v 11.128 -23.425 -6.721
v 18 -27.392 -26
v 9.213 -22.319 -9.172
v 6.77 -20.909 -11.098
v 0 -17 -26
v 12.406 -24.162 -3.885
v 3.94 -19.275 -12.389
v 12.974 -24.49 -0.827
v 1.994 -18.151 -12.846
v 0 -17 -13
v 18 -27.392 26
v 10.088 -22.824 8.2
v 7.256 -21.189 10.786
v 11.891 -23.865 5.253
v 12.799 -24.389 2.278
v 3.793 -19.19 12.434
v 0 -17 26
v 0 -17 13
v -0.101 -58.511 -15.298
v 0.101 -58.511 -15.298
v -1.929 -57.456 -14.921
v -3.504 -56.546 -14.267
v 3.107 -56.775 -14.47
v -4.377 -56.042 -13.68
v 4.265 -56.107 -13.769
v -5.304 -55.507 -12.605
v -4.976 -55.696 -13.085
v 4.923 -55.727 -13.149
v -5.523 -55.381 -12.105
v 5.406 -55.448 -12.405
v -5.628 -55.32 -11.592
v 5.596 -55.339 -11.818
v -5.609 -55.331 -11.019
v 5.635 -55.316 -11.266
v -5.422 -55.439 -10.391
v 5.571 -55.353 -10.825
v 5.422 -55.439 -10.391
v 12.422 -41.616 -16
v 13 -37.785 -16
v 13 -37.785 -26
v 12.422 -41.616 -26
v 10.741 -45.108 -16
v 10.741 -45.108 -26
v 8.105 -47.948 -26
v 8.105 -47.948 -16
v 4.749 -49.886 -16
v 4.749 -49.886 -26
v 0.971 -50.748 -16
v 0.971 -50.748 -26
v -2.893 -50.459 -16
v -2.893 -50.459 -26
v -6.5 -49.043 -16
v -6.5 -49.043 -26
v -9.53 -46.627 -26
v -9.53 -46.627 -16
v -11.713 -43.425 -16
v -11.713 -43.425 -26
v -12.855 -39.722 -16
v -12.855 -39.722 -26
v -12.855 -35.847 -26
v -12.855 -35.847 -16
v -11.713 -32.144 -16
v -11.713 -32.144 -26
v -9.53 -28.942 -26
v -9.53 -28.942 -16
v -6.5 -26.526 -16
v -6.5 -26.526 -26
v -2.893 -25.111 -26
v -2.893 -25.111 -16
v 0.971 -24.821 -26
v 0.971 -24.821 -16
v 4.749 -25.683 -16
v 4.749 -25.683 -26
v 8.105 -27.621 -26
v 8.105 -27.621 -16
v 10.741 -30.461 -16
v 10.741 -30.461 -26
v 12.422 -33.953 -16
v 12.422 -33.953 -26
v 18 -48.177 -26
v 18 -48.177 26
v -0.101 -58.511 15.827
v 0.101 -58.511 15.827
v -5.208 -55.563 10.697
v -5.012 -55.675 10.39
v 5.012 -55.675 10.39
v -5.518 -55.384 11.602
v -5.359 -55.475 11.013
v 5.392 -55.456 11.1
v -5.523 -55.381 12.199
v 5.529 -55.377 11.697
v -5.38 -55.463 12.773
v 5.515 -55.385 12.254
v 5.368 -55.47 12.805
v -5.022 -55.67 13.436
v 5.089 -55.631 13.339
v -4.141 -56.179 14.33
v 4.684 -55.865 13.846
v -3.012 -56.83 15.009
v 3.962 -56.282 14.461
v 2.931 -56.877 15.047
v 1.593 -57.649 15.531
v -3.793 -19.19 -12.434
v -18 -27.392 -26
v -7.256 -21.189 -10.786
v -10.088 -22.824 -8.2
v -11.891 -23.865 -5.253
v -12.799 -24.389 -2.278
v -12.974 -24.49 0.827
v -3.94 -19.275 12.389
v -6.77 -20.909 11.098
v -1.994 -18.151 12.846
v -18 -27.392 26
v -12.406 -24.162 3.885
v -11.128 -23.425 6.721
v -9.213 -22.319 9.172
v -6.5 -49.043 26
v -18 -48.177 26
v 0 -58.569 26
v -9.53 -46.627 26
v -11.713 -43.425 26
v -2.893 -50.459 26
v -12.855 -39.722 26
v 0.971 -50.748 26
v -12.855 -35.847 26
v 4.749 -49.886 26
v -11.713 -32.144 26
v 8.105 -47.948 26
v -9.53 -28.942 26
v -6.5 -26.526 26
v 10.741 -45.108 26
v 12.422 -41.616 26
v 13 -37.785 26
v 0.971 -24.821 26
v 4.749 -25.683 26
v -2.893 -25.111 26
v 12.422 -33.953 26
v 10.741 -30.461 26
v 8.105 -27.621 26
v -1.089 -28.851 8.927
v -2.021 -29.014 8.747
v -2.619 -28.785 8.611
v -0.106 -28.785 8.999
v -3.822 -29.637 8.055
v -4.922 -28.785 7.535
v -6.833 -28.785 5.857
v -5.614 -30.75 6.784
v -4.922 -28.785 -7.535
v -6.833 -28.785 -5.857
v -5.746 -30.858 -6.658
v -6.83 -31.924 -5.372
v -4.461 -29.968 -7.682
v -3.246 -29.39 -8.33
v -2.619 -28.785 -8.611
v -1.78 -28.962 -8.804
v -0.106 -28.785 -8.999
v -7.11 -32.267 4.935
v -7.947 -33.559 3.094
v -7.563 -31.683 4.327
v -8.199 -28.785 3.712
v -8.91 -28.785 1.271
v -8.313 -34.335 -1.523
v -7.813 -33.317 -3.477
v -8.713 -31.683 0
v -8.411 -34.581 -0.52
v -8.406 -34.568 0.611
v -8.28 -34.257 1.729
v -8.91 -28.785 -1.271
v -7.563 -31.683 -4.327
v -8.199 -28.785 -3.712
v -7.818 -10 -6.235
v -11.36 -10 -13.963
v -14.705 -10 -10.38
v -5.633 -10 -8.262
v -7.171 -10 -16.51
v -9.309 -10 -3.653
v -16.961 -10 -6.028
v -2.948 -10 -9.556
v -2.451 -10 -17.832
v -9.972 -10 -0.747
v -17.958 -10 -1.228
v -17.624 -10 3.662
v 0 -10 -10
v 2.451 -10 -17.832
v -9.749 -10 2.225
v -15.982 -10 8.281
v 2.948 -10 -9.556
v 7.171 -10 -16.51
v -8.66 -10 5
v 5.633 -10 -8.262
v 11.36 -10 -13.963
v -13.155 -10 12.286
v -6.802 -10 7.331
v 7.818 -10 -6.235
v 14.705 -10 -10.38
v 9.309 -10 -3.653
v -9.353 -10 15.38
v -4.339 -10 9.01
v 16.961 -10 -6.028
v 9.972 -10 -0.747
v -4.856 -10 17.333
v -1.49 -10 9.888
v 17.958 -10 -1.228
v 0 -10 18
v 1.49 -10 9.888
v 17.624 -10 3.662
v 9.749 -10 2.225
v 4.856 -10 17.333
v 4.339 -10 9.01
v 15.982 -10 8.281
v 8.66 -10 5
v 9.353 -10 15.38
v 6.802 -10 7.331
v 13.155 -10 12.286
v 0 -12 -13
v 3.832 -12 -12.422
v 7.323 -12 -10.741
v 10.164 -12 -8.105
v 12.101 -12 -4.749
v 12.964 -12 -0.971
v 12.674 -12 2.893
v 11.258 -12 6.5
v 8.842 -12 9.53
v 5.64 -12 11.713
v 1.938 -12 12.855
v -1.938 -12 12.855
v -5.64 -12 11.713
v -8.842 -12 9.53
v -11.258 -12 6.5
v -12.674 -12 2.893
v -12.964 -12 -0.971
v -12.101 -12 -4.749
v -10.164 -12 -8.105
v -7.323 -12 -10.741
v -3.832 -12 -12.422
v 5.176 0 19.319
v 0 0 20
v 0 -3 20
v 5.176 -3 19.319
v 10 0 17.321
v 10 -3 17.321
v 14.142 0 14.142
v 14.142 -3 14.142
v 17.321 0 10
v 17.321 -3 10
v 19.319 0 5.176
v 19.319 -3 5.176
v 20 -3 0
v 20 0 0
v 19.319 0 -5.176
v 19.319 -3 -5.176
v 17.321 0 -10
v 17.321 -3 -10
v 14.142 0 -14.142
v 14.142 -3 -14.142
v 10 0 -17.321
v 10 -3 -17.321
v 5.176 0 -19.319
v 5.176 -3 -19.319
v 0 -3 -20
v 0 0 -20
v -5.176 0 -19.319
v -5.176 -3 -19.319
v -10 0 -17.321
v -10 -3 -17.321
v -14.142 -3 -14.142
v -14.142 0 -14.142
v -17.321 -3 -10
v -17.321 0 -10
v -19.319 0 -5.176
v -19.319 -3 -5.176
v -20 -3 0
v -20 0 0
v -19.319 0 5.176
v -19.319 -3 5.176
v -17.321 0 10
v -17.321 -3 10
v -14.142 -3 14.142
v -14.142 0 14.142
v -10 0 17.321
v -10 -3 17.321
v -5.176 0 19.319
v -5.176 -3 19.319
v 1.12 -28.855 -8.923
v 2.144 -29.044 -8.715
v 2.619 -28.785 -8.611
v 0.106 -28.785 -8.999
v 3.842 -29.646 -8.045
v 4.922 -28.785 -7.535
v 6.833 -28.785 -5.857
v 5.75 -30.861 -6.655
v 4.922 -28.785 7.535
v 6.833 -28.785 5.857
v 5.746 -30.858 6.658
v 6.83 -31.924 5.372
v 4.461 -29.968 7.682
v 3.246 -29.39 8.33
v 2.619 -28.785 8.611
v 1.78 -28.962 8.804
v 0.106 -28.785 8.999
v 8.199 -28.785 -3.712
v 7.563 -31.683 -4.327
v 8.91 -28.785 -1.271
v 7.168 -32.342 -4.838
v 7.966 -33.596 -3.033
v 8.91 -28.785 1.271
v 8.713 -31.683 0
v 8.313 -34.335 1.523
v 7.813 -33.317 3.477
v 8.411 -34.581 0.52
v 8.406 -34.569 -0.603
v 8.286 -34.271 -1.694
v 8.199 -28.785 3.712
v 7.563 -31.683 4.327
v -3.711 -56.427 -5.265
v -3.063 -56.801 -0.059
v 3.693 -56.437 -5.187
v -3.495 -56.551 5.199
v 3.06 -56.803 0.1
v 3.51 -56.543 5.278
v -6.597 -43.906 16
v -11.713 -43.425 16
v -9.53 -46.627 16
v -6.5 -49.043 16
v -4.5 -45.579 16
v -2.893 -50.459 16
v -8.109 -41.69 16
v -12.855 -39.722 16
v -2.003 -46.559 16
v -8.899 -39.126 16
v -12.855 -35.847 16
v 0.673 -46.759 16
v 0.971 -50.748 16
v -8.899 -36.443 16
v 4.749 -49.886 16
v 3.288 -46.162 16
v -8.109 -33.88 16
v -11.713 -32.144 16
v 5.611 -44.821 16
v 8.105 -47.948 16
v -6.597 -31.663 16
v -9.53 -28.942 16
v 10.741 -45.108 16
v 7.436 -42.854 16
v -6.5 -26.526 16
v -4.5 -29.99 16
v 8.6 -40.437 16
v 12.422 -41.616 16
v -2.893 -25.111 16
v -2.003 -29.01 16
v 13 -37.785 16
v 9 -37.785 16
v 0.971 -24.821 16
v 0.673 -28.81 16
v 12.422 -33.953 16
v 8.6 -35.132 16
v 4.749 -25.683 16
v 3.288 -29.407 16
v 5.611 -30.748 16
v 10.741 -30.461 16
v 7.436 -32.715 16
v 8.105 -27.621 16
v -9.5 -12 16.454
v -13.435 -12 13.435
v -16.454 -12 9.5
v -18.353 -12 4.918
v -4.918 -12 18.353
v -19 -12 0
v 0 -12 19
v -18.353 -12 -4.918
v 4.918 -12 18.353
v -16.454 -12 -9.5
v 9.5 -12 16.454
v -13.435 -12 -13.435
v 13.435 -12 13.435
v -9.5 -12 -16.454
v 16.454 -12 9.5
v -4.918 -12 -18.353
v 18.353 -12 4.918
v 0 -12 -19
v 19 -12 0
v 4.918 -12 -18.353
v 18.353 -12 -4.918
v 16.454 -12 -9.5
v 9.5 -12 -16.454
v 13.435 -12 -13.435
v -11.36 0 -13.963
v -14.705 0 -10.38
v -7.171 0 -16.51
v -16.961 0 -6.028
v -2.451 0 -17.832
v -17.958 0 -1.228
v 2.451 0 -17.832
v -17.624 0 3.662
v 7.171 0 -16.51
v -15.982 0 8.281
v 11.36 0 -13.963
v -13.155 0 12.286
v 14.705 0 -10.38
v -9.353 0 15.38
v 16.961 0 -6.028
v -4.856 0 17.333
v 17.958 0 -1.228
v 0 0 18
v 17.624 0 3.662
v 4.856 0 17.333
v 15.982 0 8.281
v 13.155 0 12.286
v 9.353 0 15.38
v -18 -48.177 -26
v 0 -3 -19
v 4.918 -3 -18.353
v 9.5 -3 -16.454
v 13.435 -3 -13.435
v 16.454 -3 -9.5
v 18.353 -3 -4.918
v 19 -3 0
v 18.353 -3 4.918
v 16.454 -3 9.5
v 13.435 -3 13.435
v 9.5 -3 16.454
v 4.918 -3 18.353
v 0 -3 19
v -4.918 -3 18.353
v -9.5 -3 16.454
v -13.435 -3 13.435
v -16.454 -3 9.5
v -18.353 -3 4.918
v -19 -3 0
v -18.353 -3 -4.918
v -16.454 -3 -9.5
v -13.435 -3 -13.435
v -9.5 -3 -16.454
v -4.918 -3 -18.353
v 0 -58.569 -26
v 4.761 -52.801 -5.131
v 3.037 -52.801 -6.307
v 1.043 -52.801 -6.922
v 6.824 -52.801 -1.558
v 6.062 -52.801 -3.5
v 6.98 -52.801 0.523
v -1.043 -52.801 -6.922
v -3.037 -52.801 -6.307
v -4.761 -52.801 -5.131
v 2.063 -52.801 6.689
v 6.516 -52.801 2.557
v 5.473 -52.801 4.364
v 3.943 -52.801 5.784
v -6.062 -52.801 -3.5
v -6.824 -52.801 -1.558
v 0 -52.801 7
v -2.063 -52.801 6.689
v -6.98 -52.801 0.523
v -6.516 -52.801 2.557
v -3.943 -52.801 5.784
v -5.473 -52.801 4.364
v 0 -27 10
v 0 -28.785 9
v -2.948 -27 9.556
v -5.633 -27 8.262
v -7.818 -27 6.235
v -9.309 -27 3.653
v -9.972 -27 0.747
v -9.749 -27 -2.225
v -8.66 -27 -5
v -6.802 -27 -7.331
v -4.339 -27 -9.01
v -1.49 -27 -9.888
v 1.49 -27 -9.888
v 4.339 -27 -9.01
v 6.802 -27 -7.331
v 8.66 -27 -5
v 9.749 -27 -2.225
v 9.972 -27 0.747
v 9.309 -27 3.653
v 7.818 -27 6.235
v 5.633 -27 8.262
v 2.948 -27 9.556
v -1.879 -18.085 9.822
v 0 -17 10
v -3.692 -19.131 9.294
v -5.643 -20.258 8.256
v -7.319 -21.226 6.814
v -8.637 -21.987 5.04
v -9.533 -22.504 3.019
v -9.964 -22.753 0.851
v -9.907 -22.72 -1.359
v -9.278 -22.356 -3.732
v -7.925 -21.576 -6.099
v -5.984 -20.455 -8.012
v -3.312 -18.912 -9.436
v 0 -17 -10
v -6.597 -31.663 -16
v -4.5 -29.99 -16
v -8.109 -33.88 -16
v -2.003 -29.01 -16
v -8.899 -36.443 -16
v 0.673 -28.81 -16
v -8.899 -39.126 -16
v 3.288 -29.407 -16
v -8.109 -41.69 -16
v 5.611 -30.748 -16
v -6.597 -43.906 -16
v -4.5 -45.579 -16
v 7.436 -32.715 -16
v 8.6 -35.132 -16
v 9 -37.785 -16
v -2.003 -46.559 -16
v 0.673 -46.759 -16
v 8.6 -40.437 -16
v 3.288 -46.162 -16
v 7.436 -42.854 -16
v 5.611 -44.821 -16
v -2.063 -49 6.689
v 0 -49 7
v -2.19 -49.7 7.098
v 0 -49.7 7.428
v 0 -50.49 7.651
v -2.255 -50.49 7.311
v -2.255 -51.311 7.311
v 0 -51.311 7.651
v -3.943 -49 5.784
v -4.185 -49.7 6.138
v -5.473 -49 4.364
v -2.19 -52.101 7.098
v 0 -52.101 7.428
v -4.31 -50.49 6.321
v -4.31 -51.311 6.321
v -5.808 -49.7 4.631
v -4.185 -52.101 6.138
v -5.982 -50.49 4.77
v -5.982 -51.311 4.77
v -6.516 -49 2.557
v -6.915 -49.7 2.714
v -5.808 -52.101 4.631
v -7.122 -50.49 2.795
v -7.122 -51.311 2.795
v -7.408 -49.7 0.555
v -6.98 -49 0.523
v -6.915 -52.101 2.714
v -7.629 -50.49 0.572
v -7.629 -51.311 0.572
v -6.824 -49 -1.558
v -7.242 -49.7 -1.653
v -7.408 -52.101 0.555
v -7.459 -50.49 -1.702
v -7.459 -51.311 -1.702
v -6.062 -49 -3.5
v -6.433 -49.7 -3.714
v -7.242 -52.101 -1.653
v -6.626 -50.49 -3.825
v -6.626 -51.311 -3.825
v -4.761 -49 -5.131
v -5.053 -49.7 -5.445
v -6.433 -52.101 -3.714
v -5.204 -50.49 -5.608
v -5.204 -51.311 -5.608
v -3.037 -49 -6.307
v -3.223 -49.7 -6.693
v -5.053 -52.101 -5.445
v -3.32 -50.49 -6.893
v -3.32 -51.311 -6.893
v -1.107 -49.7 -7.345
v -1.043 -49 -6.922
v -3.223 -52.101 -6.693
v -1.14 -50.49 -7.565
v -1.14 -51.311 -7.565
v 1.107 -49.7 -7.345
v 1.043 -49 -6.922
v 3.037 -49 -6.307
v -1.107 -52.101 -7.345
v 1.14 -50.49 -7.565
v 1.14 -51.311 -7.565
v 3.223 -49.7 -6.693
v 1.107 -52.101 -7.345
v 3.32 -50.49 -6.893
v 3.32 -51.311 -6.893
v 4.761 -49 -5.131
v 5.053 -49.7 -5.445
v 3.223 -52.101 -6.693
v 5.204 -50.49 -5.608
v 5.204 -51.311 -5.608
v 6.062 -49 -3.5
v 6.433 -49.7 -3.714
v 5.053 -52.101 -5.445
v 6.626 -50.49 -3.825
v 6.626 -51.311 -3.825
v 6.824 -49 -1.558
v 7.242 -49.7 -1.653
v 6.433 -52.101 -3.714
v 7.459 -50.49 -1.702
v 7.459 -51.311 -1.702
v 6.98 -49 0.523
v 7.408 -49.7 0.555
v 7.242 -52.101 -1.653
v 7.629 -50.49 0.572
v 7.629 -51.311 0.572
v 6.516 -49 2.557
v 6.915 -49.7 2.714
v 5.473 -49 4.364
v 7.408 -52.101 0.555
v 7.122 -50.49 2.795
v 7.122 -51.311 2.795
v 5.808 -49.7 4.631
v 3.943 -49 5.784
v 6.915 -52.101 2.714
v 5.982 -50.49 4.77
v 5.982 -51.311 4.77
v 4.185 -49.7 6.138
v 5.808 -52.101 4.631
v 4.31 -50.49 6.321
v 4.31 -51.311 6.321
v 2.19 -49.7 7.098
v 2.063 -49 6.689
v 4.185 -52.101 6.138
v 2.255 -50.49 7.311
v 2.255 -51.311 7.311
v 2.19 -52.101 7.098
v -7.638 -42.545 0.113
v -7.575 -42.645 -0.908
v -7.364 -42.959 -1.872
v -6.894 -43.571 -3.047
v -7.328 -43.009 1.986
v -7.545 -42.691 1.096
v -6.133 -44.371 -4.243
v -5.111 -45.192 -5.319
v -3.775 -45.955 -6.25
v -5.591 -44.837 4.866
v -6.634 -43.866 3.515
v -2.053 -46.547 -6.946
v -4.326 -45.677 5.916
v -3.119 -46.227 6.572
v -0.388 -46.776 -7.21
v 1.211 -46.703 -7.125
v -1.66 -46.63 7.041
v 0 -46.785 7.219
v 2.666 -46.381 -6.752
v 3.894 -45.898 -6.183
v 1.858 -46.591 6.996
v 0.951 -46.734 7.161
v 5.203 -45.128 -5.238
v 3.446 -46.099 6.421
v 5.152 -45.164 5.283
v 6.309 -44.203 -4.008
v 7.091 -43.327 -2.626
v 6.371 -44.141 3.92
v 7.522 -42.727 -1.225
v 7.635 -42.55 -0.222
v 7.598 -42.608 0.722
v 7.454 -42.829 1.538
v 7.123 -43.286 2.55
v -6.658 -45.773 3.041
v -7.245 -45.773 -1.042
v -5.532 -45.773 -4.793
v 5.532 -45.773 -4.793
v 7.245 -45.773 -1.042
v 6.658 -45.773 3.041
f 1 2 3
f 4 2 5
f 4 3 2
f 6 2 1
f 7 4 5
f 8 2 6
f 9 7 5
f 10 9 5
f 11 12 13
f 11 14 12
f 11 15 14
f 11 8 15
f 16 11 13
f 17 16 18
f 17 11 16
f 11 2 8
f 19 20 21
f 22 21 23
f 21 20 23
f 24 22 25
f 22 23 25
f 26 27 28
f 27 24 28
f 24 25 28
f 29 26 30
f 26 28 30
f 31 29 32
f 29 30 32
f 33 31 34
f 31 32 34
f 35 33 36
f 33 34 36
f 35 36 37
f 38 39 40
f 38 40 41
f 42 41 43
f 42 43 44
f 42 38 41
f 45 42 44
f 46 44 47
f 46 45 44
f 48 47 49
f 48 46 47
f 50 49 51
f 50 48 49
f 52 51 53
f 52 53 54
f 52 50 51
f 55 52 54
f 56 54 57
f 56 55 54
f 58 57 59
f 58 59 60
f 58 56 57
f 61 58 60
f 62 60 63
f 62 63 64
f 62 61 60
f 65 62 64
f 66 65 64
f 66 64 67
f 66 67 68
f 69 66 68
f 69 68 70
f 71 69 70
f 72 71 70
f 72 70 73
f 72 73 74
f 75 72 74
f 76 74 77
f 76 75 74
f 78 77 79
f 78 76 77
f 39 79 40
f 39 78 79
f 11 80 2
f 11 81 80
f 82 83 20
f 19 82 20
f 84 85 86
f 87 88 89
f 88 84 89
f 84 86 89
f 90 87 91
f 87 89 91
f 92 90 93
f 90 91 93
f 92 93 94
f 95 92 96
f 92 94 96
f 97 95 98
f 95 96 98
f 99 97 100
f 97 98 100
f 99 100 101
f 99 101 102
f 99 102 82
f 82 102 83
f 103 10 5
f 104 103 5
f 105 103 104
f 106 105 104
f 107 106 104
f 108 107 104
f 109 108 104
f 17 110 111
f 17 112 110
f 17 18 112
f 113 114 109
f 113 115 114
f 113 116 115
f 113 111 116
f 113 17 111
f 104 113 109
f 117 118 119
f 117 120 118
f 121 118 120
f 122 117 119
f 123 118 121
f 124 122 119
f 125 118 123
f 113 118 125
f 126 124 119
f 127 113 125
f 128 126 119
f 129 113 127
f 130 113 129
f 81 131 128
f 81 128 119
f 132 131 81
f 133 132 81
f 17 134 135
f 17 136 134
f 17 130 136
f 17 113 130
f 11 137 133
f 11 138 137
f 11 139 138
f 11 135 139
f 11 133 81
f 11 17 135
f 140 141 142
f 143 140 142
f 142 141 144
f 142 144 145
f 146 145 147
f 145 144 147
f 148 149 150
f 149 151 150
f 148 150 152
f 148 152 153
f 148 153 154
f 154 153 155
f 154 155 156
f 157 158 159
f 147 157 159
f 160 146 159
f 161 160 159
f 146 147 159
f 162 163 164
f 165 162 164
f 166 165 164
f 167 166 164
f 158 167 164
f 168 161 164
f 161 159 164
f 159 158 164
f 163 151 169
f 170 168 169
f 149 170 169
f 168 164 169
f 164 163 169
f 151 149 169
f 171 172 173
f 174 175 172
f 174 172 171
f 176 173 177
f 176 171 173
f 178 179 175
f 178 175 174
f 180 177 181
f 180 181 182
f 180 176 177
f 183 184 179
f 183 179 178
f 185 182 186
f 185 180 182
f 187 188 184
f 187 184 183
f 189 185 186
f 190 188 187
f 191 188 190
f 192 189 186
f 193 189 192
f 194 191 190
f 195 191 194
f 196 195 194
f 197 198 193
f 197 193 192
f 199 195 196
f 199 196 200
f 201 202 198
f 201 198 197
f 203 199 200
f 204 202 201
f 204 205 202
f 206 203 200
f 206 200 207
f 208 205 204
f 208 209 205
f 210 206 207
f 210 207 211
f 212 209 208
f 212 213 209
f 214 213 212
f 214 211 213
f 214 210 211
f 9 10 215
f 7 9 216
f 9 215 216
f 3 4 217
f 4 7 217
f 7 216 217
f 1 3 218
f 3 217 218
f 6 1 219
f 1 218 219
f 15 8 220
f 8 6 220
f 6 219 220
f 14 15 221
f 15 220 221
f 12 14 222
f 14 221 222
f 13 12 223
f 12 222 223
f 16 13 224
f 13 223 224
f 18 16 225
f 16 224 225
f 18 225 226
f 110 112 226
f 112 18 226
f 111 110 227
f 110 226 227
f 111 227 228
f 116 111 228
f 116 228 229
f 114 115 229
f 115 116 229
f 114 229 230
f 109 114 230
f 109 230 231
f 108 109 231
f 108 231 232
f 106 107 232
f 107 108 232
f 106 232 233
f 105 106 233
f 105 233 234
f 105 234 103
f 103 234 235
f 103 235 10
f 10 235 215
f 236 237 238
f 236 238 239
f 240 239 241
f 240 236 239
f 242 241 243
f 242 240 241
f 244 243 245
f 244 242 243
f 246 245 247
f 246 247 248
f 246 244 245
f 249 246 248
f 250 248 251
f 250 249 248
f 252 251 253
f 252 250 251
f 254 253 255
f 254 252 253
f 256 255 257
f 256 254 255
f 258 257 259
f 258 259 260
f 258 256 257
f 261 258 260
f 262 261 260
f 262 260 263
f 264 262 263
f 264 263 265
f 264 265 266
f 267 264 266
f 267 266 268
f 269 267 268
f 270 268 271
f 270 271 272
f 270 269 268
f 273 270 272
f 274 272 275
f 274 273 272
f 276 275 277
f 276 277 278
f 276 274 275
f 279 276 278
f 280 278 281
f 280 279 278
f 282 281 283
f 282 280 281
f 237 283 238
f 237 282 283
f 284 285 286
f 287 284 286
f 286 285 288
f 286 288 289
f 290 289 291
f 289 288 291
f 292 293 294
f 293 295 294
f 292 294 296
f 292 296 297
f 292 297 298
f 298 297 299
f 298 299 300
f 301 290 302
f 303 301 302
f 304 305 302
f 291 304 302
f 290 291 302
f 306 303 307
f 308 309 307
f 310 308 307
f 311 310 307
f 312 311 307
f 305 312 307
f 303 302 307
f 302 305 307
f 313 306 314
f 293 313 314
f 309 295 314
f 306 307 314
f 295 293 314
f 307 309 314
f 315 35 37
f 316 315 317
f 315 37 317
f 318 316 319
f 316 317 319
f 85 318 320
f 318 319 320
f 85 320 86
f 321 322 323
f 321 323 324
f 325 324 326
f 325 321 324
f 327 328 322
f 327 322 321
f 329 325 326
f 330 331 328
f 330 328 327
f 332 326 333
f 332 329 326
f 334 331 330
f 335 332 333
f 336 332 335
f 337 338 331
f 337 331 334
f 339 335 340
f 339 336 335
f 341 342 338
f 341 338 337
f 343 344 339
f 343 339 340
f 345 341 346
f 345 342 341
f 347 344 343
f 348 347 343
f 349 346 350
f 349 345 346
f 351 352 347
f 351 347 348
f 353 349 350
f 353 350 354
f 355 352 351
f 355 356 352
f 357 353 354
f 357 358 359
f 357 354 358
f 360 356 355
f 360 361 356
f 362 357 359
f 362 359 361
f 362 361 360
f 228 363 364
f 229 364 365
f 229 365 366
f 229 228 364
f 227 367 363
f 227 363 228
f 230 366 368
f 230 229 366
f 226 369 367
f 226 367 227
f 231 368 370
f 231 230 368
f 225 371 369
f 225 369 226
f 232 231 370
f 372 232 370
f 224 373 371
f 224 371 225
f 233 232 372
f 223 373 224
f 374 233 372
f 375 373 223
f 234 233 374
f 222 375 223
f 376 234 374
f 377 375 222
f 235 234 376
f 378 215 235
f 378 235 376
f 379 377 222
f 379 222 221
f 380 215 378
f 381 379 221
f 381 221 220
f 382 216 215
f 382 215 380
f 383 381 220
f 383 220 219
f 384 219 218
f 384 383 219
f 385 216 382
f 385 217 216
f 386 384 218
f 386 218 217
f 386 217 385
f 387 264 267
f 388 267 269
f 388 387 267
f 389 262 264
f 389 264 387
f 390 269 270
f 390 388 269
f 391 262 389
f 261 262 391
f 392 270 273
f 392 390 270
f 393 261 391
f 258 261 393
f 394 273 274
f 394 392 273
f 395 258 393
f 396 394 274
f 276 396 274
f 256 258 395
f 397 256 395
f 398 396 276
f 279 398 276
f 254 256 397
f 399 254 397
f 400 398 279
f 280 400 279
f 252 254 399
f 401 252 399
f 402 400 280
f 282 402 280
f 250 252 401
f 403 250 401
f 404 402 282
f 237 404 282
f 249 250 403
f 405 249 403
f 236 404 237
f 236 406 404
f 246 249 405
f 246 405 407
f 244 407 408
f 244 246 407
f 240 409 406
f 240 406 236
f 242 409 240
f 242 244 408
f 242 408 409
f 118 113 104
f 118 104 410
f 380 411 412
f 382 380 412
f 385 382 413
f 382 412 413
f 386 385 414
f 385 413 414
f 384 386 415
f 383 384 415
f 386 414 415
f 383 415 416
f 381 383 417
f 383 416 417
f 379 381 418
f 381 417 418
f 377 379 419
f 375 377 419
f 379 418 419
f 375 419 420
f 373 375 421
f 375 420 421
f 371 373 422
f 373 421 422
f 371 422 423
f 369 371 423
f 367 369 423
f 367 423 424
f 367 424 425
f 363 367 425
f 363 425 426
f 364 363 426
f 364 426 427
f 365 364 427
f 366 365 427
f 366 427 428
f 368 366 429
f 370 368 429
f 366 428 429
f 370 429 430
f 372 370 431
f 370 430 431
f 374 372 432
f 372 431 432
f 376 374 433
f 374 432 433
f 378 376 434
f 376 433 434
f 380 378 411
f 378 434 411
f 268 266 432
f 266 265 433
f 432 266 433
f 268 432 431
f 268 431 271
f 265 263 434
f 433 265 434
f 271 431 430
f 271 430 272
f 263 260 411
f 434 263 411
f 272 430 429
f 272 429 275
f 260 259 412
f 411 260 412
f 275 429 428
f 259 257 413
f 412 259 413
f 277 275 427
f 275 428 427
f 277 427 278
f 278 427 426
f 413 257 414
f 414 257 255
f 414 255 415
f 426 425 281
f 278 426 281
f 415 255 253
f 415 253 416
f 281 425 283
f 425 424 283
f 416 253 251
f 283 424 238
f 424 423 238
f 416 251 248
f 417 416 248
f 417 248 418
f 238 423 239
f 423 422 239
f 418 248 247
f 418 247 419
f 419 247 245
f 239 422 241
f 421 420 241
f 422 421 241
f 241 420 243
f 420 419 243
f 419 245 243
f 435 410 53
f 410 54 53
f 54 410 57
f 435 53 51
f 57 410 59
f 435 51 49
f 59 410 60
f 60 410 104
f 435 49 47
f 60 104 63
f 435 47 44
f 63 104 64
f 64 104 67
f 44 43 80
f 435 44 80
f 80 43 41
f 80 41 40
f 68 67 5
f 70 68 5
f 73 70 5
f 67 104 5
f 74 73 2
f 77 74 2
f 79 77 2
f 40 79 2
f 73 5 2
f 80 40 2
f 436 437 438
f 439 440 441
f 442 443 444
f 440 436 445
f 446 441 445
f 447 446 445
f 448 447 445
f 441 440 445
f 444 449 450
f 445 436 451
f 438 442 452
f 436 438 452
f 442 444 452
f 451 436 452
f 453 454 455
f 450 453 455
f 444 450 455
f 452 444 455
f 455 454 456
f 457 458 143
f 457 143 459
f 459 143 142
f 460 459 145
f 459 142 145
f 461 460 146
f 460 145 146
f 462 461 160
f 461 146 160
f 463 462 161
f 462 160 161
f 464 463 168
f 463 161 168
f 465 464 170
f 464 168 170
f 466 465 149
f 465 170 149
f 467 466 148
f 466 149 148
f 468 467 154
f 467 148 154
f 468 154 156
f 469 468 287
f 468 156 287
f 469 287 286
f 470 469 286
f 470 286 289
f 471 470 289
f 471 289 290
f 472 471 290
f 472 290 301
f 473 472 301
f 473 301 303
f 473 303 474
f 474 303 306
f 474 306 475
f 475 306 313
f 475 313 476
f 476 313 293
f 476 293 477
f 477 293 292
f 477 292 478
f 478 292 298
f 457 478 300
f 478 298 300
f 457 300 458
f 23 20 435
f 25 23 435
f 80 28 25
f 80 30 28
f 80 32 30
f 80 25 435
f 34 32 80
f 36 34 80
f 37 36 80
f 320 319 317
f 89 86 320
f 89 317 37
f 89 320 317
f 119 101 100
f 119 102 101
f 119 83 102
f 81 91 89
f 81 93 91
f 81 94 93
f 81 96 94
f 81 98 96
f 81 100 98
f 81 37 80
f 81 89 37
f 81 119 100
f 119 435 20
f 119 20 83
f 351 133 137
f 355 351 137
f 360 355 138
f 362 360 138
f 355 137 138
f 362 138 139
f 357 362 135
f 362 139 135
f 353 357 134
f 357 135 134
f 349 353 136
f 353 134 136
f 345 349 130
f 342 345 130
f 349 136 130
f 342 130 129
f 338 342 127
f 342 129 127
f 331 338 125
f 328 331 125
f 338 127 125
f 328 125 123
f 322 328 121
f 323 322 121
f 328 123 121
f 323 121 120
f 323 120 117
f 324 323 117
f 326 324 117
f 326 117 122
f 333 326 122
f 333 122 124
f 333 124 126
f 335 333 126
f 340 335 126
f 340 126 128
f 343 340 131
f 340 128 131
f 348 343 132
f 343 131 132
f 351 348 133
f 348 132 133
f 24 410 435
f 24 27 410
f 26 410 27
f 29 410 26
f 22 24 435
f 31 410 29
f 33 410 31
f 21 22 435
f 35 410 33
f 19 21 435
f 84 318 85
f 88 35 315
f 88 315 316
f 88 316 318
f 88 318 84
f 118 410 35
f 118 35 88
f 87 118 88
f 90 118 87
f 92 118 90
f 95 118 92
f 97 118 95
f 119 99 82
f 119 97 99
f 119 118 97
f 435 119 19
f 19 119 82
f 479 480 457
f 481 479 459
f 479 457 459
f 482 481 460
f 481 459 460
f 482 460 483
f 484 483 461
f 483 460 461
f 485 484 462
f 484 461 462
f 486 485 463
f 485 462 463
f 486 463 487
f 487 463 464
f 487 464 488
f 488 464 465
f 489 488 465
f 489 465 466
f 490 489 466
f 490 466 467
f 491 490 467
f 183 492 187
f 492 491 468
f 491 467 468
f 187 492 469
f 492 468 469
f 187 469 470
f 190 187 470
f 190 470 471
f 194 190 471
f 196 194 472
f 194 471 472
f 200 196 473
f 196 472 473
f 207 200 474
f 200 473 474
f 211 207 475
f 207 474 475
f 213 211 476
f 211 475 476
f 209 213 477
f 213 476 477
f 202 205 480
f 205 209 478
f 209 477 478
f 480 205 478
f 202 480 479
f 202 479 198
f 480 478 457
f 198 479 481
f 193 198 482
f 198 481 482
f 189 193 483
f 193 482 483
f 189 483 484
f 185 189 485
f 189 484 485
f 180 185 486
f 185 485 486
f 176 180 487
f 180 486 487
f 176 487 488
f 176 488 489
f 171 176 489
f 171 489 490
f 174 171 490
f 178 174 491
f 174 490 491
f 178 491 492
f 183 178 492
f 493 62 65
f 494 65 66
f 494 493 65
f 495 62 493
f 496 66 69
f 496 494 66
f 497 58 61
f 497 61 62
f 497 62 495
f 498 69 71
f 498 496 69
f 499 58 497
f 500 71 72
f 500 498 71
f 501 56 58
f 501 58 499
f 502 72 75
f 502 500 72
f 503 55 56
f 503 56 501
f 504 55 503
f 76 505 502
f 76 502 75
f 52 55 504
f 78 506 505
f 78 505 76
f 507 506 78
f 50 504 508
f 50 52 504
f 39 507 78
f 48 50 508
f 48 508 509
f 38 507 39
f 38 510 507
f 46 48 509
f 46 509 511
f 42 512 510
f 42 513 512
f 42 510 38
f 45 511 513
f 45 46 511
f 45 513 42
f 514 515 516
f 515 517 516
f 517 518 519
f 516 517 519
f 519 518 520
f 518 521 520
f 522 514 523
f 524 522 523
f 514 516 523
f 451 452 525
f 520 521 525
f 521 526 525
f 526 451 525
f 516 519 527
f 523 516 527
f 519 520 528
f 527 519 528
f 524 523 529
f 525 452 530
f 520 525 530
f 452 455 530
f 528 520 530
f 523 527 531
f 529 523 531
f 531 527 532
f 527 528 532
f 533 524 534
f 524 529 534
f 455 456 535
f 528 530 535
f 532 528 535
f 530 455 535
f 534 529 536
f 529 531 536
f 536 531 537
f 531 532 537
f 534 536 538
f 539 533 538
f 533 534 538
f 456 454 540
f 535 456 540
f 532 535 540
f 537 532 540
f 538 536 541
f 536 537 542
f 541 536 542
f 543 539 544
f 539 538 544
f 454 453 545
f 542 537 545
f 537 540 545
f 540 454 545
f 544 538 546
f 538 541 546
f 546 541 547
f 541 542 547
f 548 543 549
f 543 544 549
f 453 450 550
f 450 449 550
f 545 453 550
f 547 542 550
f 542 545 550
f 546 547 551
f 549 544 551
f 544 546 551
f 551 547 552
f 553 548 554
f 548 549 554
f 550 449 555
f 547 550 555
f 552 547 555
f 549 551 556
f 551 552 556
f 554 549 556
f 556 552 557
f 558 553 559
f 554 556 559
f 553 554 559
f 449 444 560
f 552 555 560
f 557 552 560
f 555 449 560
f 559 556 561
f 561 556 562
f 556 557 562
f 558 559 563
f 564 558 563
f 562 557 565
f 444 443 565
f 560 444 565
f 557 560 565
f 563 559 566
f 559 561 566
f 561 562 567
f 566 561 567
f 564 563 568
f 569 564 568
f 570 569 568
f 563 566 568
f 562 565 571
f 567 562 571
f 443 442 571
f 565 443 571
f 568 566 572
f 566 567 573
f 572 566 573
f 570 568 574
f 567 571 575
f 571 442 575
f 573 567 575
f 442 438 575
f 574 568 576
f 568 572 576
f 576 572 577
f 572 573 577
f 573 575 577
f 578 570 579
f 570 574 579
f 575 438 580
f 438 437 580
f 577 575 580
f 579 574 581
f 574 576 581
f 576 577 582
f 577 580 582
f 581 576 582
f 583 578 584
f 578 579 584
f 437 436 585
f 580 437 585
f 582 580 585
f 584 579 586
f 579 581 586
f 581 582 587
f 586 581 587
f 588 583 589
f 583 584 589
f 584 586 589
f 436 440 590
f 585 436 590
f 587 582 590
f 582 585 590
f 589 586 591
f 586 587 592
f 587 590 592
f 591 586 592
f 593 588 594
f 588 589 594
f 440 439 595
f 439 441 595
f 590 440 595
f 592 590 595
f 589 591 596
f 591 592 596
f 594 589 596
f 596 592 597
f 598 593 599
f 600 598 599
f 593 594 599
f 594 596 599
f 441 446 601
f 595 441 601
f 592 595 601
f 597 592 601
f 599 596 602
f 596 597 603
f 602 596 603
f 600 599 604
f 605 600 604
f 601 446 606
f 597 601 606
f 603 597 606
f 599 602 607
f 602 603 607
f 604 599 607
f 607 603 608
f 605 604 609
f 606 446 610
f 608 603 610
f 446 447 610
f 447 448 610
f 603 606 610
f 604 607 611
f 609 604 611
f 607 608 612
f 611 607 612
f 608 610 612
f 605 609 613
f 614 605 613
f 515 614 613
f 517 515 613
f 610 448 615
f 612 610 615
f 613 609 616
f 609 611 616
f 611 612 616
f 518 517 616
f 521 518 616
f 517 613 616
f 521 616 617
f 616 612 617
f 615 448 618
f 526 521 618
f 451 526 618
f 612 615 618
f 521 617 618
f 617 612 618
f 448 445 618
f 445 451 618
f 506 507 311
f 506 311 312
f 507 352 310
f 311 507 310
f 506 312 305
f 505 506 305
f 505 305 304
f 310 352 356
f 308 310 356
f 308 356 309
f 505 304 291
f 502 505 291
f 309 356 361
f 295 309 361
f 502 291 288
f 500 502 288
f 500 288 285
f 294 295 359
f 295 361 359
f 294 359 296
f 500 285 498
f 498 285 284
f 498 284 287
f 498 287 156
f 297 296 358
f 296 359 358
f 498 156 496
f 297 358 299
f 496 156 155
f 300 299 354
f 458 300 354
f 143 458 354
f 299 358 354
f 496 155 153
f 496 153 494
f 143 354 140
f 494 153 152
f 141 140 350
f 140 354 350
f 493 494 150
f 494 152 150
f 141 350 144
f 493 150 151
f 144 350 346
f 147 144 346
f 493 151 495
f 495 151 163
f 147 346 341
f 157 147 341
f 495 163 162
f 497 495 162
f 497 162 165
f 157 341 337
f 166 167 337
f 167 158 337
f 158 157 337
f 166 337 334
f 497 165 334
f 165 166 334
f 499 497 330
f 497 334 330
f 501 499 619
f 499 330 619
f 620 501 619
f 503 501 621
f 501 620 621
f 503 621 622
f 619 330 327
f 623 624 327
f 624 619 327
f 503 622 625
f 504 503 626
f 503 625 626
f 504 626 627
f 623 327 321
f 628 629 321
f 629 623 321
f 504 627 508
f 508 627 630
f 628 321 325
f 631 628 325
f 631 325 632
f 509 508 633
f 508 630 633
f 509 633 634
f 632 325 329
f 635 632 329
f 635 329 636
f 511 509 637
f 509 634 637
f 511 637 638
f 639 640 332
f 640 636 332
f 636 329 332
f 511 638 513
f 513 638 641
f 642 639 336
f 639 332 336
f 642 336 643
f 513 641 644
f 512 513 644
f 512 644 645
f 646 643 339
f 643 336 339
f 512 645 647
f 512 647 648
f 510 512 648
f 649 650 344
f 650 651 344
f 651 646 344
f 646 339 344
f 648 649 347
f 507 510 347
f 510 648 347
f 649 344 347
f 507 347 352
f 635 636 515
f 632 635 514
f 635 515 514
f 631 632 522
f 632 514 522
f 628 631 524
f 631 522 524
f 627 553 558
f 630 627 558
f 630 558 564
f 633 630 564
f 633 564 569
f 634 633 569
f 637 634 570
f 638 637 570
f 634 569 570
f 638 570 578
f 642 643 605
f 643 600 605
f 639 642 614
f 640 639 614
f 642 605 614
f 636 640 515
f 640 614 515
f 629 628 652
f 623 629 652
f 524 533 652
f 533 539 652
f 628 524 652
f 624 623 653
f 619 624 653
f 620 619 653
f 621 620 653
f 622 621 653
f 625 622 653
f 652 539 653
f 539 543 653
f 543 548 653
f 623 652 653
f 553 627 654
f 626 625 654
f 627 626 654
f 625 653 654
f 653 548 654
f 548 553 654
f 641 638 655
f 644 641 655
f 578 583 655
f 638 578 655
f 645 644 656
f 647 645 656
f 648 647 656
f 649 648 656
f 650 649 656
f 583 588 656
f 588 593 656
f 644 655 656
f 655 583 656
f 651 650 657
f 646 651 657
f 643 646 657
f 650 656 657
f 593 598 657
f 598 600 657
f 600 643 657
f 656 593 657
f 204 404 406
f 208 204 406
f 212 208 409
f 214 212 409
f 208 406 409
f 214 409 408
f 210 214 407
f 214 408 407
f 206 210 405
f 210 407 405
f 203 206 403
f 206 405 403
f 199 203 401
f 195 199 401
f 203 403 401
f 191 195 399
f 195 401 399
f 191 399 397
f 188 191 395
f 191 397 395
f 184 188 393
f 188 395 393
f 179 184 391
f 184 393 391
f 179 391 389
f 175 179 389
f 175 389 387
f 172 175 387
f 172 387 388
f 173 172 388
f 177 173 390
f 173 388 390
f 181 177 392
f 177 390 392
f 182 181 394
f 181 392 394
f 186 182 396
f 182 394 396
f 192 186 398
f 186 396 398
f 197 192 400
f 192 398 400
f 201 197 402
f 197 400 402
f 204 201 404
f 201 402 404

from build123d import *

# Parameters (mm, degrees)
SKETCH4_R           = 20
BOSS_EXTRUDE2_DEPTH = 3
SKETCH5_R           = 19
BOSS_EXTRUDE3_DEPTH = 9
SKETCH6_R           = 13
BOSS_EXTRUDE4_DEPTH = 17
SKETCH7_R           = 18
CUT_EXTRUDE3_DEPTH  = 10
SKETCH8_R           = 10
CUT_EXTRUDE4_DEPTH  = 19
BOSS_EXTRUDE5_DEPTH = 26
SKETCH10_R          = 13
CUT_EXTRUDE5_DEPTH  = 10
SKETCH11_R          = 9
CUT_EXTRUDE6_DEPTH  = 26
CUT_EXTRUDE7_START  = -10
SKETCH12_R          = 13
CUT_EXTRUDE7_DEPTH  = 10
CUT_EXTRUDE8_START  = -20
SKETCH13_R          = 9
CUT_EXTRUDE8_DEPTH  = 20
CUT_EXTRUDE15_DEPTH = 10.15


with BuildPart() as part:
    # Sketch4 → Boss-Extrude2 (new body)
    with BuildSketch(Plane(origin=(0, 0, 0), x_dir=(1, 0, 0), z_dir=(0, 1, 0))):
        with Locations(Location((0, 0, 0), (0, 0, 270))):
            Circle(SKETCH4_R)
    extrude(amount=-BOSS_EXTRUDE2_DEPTH)

    # Sketch5 → Boss-Extrude3 (add)
    with BuildSketch(Plane.XZ.offset(3)):
        with Locations(Location((0, 0, 0), (0, 0, 270))):
            Circle(SKETCH5_R)
    extrude(amount=BOSS_EXTRUDE3_DEPTH)

    # Sketch6 → Boss-Extrude4 (add)
    with BuildSketch(Plane.XZ.offset(12)):
        with Locations(Location((0, 0, 0), (0, 0, 270))):
            Circle(SKETCH6_R)
    extrude(amount=BOSS_EXTRUDE4_DEPTH)

    # Sketch7 → Cut-Extrude3 (cut)
    with BuildSketch(Plane(origin=(0, 0, 0), x_dir=(1, 0, 0), z_dir=(0, 1, 0))):
        with Locations(Location((0, 0, 0), (0, 0, 270))):
            Circle(SKETCH7_R)
    extrude(amount=-CUT_EXTRUDE3_DEPTH, mode=Mode.SUBTRACT)

    # Sketch8 → Cut-Extrude4 (cut)
    with BuildSketch(Plane.XZ.offset(29)):
        with Locations(Location((0, 0, 0), (0, 0, 270))):
            Circle(SKETCH8_R)
    extrude(amount=-CUT_EXTRUDE4_DEPTH, mode=Mode.SUBTRACT)

    # Sketch9 → Boss-Extrude5 (add, symmetric)
    with BuildSketch(Plane.XY):
        Polygon((0, -17), (-18, -27.392304845), (-18, -48.176914536), (0, -58.569219382), (18, -48.176914536), (18, -27.392304845), align=None)
    extrude(amount=BOSS_EXTRUDE5_DEPTH, both=True)

    # Sketch10 → Cut-Extrude5 (cut)
    with BuildSketch(Plane.XY.offset(26)):
        with Locations((0, -37.784609691)):
            Circle(SKETCH10_R)
    extrude(amount=-CUT_EXTRUDE5_DEPTH, mode=Mode.SUBTRACT)

    # Sketch11 → Cut-Extrude6 (cut)
    with BuildSketch(Plane.XY.offset(16)):
        with Locations((0, -37.784609691)):
            Circle(SKETCH11_R)
    extrude(amount=-CUT_EXTRUDE6_DEPTH, mode=Mode.SUBTRACT)

    # Sketch12 → Cut-Extrude7 (cut)
    with BuildSketch(Plane(origin=(0, 0, -26), x_dir=(-1, 0, 0), z_dir=(0, 0, -1)).offset(CUT_EXTRUDE7_START)):
        with Locations(Location((0, -37.784609691, 0), (0, 0, 180))):
            Circle(SKETCH12_R)
    extrude(amount=CUT_EXTRUDE7_DEPTH, mode=Mode.SUBTRACT)

    # Sketch13 → Cut-Extrude8 (cut)
    with BuildSketch(Plane(origin=(0, 0, -16), x_dir=(-1, 0, 0), z_dir=(0, 0, -1)).offset(CUT_EXTRUDE8_START)):
        with Locations(Location((0, -37.784609691, 0), (0, 0, 180))):
            Circle(SKETCH13_R)
    extrude(amount=CUT_EXTRUDE8_DEPTH, mode=Mode.SUBTRACT)

    # Sketch30 → Cut-Extrude15 (cut, symmetric)
    with BuildSketch(Plane(origin=(0, 0, 0), x_dir=(0, 0, -1), z_dir=(1, 0, 0))):
        with BuildLine():
            Line((-15.826629517, -58.510939608), (15.298060877, -58.510939608))
            ThreePointArc((15.298060877, -58.510939608), (13.502204004, -55.924078568), (10.390732376, -55.438592985))
            ThreePointArc((10.390732376, -55.438592985), (0.01479369, -56.801466399), (-10.38951563, -55.675466788))
            ThreePointArc((-10.38951563, -55.675466788), (-13.769795356, -55.824327649), (-15.826629517, -58.510939608))
        make_face()
    extrude(amount=CUT_EXTRUDE15_DEPTH, both=True, mode=Mode.SUBTRACT)

    # Sketch36 → Cut-Revolve2 (revolve, cut)
    with BuildSketch(Plane(origin=(0, 0, 0), x_dir=(0, 0, -1), z_dir=(1, 0, 0))):
        with BuildLine():
            Line((-7, -52.801466399), (0, -52.801466399))
            Line((0, -52.801466399), (0, -17))
            Line((0, -17), (-10, -17))
            Line((-10, -17), (-10, -27))
            Line((-10, -27), (-9, -28.785233738))
            Line((-9, -28.785233738), (-7, -49))
            ThreePointArc((-7, -49), (-7.678962882, -50.900733199), (-7, -52.801466399))
        make_face()
    revolve(axis=Axis((0, -17, 0), (0, -1, 0)), mode=Mode.SUBTRACT)


solid = part.part
